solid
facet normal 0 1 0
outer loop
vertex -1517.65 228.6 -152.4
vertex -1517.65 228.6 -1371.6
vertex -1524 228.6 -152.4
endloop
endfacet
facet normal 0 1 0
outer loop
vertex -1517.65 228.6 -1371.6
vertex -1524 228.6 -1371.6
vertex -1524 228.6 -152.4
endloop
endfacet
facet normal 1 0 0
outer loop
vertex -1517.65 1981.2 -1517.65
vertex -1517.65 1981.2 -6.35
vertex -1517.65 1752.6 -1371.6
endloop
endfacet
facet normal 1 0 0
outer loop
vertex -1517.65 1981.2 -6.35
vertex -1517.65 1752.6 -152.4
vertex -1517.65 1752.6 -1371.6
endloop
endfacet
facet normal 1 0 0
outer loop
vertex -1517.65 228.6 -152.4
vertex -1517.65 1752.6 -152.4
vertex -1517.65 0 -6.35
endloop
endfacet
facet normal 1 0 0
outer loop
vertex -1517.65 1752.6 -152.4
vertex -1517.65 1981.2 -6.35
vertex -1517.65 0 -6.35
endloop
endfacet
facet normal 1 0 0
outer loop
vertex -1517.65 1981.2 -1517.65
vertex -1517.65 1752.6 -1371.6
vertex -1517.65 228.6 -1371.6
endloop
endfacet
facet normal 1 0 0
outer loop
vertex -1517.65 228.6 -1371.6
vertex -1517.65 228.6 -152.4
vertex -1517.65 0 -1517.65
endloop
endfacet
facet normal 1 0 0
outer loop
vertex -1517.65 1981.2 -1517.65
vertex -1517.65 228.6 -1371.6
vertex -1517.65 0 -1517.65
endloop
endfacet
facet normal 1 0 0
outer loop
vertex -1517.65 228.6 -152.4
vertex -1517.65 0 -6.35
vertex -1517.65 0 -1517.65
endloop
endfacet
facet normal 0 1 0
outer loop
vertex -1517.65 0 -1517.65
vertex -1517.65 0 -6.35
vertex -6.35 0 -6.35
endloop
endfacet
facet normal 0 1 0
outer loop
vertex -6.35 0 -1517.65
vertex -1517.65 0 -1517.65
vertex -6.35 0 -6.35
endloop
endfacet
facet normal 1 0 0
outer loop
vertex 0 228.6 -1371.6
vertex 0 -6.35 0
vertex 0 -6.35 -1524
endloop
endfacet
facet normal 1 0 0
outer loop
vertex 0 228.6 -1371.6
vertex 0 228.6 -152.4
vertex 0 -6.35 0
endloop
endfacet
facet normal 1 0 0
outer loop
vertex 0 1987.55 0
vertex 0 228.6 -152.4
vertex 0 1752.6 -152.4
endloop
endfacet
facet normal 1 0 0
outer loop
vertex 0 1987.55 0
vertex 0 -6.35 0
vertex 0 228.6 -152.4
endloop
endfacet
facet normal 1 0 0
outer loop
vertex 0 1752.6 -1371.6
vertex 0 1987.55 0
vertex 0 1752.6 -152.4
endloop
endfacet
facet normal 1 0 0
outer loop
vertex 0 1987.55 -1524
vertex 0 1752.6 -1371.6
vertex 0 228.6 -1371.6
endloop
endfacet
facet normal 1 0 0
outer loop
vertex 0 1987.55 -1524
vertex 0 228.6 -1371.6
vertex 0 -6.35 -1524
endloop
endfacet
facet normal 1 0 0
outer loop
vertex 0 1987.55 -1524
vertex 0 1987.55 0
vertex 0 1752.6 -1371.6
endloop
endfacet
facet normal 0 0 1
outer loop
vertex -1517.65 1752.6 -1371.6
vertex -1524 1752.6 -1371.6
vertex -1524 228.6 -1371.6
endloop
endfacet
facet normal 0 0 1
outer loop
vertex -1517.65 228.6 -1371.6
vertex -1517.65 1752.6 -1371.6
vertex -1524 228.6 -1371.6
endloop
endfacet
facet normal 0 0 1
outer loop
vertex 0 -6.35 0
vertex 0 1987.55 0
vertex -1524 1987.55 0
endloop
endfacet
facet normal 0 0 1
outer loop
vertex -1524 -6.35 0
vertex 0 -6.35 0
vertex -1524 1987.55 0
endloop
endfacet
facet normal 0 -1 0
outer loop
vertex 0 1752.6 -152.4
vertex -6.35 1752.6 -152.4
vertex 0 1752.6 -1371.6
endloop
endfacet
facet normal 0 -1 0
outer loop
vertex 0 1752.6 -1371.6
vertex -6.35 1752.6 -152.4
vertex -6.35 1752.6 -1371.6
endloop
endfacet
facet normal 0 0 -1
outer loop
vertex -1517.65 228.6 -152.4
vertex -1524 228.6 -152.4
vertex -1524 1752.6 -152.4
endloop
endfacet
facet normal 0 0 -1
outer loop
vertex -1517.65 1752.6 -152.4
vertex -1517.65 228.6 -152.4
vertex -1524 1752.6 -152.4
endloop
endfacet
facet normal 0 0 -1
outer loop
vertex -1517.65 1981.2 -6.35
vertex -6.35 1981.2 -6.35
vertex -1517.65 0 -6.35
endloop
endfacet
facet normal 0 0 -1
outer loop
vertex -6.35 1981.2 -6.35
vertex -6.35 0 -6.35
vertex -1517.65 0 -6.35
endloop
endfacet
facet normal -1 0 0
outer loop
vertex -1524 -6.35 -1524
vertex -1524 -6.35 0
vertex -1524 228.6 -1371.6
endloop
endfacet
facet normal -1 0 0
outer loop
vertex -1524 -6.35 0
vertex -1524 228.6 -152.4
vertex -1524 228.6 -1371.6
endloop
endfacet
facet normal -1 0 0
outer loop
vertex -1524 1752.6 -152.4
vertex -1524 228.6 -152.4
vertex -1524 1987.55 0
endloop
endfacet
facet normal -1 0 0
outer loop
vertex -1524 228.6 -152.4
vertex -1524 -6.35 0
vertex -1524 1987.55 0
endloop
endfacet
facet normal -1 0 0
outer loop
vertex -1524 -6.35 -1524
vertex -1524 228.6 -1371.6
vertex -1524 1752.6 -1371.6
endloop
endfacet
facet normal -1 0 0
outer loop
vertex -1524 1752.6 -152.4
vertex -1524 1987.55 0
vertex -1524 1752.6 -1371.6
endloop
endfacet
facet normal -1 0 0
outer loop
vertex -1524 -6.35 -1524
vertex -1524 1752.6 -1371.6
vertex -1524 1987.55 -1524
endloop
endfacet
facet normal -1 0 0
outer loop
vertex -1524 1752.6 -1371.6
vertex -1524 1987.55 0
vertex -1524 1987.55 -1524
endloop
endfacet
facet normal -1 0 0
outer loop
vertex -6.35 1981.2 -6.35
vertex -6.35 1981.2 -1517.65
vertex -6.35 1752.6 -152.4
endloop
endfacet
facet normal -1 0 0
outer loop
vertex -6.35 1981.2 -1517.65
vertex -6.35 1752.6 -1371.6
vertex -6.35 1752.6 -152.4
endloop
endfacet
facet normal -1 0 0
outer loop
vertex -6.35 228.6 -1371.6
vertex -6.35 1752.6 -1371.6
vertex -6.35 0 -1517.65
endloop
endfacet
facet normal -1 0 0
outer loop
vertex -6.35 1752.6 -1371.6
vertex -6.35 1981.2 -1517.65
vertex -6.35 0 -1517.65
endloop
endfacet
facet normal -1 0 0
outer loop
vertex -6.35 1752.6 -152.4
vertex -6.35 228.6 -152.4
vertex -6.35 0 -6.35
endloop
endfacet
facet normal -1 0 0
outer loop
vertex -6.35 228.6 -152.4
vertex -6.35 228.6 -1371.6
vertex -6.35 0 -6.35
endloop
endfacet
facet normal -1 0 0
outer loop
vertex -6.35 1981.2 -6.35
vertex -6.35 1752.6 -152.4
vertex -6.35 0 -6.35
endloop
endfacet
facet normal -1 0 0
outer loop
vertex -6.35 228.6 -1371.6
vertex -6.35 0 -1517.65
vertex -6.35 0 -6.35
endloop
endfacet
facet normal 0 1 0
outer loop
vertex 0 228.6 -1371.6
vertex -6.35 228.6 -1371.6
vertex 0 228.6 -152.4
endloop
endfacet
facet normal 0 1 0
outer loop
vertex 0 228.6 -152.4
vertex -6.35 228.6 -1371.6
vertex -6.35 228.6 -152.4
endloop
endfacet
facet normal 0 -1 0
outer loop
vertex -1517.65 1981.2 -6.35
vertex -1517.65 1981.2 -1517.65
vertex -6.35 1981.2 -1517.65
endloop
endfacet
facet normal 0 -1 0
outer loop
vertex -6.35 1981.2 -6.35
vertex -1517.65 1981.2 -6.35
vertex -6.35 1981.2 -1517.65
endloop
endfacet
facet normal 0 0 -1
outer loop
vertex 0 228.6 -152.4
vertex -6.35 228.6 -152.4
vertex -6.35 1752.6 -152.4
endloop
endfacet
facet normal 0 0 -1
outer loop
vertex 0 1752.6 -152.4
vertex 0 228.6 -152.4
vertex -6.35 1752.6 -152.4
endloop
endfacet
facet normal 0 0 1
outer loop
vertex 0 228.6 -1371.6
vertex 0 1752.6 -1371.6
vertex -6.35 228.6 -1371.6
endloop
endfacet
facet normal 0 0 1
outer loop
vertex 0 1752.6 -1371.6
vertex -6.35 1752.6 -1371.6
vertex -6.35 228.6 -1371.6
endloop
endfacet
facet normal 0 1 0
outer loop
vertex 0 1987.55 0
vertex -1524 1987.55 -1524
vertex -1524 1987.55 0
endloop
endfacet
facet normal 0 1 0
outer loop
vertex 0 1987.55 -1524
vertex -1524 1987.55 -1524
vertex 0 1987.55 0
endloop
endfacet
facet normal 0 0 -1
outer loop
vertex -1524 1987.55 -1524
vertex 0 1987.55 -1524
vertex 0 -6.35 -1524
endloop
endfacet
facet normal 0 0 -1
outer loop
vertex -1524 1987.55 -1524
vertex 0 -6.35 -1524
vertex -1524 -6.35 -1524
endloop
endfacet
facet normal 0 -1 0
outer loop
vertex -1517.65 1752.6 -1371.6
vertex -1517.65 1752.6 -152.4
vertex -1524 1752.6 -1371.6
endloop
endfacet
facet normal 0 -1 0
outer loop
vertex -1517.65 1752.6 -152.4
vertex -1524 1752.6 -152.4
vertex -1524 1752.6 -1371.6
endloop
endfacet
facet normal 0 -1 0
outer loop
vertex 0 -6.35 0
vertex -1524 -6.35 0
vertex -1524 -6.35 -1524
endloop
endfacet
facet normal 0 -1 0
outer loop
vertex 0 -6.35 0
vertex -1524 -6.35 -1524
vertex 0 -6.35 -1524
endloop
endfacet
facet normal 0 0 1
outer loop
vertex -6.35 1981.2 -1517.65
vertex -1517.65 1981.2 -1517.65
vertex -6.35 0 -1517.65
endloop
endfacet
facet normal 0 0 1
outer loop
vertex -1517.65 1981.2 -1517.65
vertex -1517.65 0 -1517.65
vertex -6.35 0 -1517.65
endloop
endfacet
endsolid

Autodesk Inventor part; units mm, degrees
ref_plane "YZ Plane" through (0, 0, 0) normal (1, 0, 0) x (0, 1, 0)
ref_plane "XZ Plane" through (0, 0, 0) normal (0, 1, 0) x (-1, 0, 0)
ref_plane "XY Plane" through (0, 0, 0) normal (0, 0, 1) x (1, 0, 0)
sketch "Sketch1" plane through (0, 0, 0) normal (0, 1, 0) x (-1, 0, 0)
  line L0 (0, 0) -> (1524, 0)
  line L1 (1524, 0) -> (1524, -1524)
  line L2 (1524, -1524) -> (0, -1524)
  line L3 (0, -1524) -> (0, 0)
  line L4 (1517.65, -1517.65) -> (6.35, -1517.65)
  line L5 (6.35, -1517.65) -> (6.35, -6.35)
  line L6 (6.35, -6.35) -> (1517.65, -6.35)
  line L7 (1517.65, -6.35) -> (1517.65, -1517.65)
  dimension "d0" = 1524
  dimension "d1" = 1524
  dimension "d4" = 6.35
  dimension "d5" = 6.35
  dimension "d6" = 6.35
  dimension "d7" = 6.35
extrude "Extrusion2" add sketch "Sketch1" along normal blind 1981.2
sketch "Sketch2" plane through (0, 1981.2, 0) normal (0, 1, 0) x (1, 0, 0)
  line L0 (0, 1524) -> (-1524, 1524) projected
  line L1 (0, 0) -> (-1524, 0)
  line L2 (-1524, 0) -> (-1524, 1524)
  line L3 (-1524, 1524) -> (0, 1524)
  line L4 (0, 1524) -> (0, 0)
extrude "Extrusion3" add sketch "Sketch2" along normal blind 6.35
sketch "Sketch3" plane through (0, 0, 0) normal (0, -1, 0) x (1, 0, 0)
  line L0 (0, 0) -> (0, -1524) projected
  line L1 (0, -1524) -> (-1524, -1524) projected
  line L2 (0, 0) -> (-1524, 0)
  line L3 (-1524, 0) -> (-1524, -1524)
  line L4 (-1524, -1524) -> (0, -1524)
  line L5 (0, -1524) -> (0, 0)
extrude "Extrusion4" add sketch "Sketch3" along normal blind 6.35
sketch "Sketch5" plane through (-1524, 1987.55, -1524) normal (-1, 0, 0) x (0, 0, 1)
  line L0 (1371.6, -234.95) -> (152.4, -234.95)
  line L1 (152.4, -234.95) -> (152.4, -1758.95)
  line L2 (152.4, -1758.95) -> (1371.6, -1758.95)
  line L3 (1371.6, -1758.95) -> (1371.6, -234.95)
  line L4 (1524, -1993.9) -> (1524, 0) projected
  line L5 (1524, -1993.9) -> (0, -1993.9) projected
  point P0 (1524, -1987.55)
  dimension "d21" = 1219.2
  dimension "d22" = 1524
  dimension "d23" = 152.4
  dimension "d24" = 234.95
extrude "Extrusion6" cut sketch "Sketch5" against normal through all
properties part number "ASTRA_Body" material "Aluminum 6061"
